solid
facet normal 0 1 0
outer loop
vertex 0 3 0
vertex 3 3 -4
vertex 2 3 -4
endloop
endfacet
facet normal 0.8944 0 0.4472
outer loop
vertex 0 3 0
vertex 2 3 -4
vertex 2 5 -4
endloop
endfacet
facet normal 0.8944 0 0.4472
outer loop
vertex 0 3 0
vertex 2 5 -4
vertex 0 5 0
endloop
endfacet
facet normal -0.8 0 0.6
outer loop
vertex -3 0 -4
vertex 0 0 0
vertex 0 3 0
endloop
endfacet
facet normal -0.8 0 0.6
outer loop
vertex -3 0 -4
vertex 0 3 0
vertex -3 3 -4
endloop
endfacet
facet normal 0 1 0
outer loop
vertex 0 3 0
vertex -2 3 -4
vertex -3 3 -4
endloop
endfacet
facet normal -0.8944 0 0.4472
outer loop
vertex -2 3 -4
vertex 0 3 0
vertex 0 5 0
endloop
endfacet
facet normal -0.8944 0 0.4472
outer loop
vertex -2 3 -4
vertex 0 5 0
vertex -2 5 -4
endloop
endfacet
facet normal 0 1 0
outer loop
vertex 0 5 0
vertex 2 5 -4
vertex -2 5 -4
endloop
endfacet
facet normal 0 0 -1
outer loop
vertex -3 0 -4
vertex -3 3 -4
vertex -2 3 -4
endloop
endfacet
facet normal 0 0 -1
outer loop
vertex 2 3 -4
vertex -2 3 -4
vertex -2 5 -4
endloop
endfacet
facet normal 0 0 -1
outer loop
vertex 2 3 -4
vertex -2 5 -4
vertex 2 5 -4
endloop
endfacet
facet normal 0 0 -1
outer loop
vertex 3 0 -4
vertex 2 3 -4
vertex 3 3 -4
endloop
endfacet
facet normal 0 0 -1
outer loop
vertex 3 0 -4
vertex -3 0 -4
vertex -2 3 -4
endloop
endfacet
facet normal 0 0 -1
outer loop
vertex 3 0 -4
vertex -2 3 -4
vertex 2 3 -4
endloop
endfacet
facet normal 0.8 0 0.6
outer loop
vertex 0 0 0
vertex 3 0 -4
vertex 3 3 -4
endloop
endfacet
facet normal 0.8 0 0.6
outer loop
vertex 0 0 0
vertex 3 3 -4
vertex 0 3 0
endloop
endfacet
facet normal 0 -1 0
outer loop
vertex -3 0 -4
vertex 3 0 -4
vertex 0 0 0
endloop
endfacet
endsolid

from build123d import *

# Parameters (mm, degrees)
BOSS_EXTRUDE1_DEPTH = 3
BOSS_EXTRUDE2_DEPTH = 2


with BuildPart() as part:
    # Sketch1 → Boss-Extrude1 (new body)
    with BuildSketch(Plane(origin=(0, 0, 0), x_dir=(1, 0, 0), z_dir=(0, 1, 0))):
        Polygon((0, 0), (-3, 4), (3, 4), align=None)
    extrude(amount=BOSS_EXTRUDE1_DEPTH)

    # Sketch2 → Boss-Extrude2 (add)
    with BuildSketch(Plane(origin=(0, 3, 0), x_dir=(1, 0, 0), z_dir=(0, 1, 0))):
        Polygon((0, 0), (-2, 4), (2, 4), align=None)
    extrude(amount=BOSS_EXTRUDE2_DEPTH)


solid = part.part
